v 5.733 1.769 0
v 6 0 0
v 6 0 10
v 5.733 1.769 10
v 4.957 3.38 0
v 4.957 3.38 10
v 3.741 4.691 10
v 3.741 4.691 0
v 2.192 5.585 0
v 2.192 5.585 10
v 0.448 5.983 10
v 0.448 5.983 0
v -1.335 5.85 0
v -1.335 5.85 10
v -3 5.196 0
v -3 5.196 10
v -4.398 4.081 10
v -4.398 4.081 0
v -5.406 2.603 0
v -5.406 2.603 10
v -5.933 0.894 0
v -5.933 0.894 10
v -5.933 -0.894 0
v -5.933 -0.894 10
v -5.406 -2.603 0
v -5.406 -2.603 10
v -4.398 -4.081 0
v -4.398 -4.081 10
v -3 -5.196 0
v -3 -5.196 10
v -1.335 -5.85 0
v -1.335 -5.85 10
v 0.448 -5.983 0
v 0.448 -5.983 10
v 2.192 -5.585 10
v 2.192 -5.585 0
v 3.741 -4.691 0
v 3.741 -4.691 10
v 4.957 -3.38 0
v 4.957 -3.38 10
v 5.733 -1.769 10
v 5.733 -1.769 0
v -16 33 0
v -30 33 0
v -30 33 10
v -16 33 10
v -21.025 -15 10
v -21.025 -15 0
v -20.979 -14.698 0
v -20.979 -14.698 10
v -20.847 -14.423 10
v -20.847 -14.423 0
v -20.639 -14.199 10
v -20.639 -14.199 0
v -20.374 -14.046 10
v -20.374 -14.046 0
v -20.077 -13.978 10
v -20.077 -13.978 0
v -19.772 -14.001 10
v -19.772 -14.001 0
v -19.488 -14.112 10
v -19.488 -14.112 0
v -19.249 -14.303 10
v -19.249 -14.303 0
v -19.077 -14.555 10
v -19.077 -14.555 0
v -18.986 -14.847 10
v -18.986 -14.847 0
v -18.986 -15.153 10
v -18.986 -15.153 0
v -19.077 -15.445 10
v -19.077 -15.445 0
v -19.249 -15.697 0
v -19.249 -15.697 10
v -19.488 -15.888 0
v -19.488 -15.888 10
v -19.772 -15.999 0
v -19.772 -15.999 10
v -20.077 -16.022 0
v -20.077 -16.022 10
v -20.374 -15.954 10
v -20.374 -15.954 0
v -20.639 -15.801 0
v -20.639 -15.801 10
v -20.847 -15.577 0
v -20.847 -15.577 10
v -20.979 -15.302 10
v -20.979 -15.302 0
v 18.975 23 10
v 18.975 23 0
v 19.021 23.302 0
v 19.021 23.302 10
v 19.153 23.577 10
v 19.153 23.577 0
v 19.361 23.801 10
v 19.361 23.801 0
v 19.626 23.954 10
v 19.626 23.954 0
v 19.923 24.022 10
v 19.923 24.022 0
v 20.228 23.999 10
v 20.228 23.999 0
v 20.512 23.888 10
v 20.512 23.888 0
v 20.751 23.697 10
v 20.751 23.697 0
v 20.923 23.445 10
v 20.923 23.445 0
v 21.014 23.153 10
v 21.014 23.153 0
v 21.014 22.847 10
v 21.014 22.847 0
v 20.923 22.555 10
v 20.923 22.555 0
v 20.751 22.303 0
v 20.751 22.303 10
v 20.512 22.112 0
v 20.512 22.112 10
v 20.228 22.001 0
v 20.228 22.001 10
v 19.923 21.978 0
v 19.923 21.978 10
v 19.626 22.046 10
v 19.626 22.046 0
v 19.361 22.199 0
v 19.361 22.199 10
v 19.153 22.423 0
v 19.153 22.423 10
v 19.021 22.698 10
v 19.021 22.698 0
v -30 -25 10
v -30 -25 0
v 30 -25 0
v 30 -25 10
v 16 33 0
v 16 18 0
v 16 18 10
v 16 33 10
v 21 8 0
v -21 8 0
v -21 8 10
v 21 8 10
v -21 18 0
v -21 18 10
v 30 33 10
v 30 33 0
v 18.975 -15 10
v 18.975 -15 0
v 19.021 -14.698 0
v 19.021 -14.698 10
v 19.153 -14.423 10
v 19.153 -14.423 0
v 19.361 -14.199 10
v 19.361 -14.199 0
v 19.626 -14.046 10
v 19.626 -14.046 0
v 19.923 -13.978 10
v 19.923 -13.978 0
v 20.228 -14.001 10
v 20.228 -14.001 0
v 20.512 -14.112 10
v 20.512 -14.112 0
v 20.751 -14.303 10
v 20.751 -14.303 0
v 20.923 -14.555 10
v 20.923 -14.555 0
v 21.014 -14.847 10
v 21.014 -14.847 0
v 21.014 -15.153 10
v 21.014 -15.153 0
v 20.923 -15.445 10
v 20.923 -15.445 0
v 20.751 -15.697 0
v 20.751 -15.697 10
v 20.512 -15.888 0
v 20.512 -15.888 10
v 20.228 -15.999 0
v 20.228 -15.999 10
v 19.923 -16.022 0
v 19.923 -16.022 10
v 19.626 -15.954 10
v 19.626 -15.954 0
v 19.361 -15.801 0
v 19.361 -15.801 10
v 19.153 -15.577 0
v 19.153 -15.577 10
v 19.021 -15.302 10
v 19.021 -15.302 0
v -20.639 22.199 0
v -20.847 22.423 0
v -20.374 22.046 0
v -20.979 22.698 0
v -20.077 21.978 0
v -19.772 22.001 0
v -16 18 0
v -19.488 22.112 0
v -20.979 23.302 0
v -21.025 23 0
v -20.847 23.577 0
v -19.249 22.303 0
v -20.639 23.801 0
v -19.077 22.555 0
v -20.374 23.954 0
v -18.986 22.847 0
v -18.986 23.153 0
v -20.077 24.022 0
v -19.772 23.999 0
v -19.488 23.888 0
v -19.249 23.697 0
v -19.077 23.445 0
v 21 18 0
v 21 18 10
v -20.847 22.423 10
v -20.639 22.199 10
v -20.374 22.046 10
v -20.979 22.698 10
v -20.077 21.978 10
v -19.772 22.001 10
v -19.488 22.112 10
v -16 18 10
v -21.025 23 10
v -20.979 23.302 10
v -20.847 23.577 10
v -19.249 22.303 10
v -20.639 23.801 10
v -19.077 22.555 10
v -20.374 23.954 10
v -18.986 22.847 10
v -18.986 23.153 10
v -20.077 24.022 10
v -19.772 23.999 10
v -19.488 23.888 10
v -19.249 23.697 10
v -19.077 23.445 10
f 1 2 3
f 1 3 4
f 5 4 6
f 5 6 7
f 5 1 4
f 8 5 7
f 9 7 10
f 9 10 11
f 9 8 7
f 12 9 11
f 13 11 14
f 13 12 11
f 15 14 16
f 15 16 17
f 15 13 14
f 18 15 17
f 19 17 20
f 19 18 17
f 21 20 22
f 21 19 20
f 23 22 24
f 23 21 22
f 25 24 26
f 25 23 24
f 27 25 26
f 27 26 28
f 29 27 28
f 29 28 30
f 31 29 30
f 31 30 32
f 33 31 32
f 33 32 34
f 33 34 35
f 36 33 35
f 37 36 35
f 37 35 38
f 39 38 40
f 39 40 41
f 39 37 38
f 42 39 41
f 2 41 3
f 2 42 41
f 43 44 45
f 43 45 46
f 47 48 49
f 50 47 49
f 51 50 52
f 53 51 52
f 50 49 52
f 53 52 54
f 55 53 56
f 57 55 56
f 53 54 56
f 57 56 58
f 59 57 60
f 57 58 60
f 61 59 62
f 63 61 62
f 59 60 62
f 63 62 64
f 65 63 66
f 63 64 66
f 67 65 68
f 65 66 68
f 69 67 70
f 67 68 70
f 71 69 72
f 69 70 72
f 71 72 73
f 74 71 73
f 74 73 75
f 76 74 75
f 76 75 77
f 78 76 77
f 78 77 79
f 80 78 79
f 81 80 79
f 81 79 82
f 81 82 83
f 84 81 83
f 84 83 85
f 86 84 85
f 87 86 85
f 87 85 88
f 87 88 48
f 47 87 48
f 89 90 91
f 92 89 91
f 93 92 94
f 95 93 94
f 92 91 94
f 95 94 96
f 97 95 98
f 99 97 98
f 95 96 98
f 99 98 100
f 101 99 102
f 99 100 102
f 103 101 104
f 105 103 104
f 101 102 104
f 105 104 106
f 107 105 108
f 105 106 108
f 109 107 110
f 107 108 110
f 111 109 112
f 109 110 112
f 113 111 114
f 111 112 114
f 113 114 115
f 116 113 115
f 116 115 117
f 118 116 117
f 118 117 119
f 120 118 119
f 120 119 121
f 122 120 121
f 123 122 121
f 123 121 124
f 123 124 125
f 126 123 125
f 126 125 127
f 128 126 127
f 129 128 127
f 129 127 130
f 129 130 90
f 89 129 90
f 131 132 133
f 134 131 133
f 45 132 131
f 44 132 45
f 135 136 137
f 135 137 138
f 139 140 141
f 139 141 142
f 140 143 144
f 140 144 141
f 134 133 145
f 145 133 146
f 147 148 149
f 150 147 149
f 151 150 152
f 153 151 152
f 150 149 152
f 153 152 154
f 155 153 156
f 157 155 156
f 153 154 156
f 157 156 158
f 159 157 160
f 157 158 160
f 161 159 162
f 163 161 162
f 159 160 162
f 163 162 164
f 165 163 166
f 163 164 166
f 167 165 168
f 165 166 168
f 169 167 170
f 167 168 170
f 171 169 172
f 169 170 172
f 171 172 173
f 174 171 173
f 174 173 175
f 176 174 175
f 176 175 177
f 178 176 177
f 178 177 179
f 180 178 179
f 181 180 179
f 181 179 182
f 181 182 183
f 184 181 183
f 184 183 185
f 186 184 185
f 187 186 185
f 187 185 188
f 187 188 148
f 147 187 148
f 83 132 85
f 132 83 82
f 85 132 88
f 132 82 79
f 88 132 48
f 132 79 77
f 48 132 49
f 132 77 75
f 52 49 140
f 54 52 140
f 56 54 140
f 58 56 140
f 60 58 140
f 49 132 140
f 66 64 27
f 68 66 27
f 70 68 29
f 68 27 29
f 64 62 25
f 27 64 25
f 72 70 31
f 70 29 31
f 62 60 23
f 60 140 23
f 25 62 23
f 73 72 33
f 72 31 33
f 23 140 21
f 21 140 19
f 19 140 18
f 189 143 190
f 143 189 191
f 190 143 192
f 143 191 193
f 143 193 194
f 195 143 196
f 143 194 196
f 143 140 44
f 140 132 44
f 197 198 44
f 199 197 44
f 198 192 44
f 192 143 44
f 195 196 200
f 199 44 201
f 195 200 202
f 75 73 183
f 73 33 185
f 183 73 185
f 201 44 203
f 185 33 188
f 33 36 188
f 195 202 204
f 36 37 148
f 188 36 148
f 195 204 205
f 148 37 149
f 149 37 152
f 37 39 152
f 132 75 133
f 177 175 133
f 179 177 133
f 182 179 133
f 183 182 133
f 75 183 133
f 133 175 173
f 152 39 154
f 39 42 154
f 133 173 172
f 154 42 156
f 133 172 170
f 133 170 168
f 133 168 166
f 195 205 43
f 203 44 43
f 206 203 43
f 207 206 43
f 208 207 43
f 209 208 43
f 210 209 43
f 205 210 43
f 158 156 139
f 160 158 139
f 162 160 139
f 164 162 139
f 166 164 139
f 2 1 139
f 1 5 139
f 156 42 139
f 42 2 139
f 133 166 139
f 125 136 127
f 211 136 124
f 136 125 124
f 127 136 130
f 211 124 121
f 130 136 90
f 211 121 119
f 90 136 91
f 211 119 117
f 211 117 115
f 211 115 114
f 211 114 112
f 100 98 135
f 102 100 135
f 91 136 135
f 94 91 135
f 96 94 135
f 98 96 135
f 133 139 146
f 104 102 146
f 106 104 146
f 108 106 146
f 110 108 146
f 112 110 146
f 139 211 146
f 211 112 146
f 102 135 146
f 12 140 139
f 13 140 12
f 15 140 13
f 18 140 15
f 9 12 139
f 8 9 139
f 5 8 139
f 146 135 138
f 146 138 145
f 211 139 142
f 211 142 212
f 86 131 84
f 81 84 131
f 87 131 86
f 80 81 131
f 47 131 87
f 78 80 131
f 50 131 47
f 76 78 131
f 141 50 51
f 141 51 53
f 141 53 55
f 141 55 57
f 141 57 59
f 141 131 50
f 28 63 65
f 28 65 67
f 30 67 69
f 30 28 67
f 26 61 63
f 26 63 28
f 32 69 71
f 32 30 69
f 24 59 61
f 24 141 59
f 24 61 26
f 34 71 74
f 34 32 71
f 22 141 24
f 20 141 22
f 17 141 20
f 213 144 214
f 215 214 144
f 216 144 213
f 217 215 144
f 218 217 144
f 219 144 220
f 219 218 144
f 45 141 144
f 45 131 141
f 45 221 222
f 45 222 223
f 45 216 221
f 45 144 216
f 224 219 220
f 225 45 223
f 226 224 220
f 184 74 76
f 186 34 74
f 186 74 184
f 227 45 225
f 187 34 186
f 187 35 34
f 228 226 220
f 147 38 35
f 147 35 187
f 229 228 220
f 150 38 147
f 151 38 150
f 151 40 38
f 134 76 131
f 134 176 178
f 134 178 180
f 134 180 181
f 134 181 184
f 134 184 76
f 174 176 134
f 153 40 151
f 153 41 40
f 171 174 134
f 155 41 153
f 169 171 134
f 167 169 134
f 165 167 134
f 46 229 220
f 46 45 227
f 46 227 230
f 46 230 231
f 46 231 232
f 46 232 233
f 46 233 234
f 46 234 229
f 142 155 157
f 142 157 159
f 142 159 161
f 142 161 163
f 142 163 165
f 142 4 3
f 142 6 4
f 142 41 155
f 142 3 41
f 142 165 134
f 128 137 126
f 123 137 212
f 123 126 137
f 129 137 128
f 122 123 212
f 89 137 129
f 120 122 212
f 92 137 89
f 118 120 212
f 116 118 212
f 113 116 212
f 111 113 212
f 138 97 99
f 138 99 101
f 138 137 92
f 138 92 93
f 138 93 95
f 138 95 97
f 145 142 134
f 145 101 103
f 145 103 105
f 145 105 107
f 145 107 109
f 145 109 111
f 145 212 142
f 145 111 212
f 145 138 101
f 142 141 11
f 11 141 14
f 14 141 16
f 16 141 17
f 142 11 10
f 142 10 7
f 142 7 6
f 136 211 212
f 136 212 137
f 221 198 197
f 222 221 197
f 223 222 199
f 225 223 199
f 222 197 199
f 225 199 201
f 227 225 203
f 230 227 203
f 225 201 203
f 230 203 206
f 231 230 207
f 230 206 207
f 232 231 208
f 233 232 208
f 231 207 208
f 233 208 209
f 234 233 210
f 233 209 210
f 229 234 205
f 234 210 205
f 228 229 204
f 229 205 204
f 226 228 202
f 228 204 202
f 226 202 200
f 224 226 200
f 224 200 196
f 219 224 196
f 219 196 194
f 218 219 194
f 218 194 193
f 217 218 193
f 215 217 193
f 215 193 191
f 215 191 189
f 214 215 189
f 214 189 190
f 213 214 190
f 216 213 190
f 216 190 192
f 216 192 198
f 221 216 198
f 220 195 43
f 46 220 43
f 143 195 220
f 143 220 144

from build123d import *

# Parameters (mm, degrees)
SKETCH1_W                = 60
SKETCH1_H                = 58
SKETCH1_R                = 6
SKETCH1_W_2              = 42
SKETCH1_H_2              = 10
BOSS_EXTRUDE1_DEPTH      = 10
M2_5X0_45_TAPPED_HOLE1_D = 2.05
SKETCH4_W                = 32
SKETCH4_H                = 15
CUT_EXTRUDE1_DEPTH       = 11
CUT_EXTRUDE1_DEPTH_BACK  = 1


with BuildPart() as part:
    # Sketch1 → Boss-Extrude1 (new body)
    with BuildSketch(Plane.XY):
        with Locations((0, 4)):
            Rectangle(SKETCH1_W, SKETCH1_H)
        Circle(SKETCH1_R, mode=Mode.SUBTRACT)
        with Locations((0, 13)):
            Rectangle(SKETCH1_W_2, SKETCH1_H_2, mode=Mode.SUBTRACT)
        with Locations((0, 13)):
            Rectangle(SKETCH1_W_2, SKETCH1_H_2)
    extrude(amount=BOSS_EXTRUDE1_DEPTH)

    # M2.5x0.45 Tapped Hole1 (through all)
    with Locations(Plane.XY.offset(10)):
        with Locations((20, 23), (-20, 23), (-20, -15), (20, -15)):
            Hole(M2_5X0_45_TAPPED_HOLE1_D / 2)

    # Sketch4 → Cut-Extrude1 (cut, two sides)
    with BuildSketch(Plane.XY) as cut_extrude1_sk:
        with Locations((0, 25.5)):
            Rectangle(SKETCH4_W, SKETCH4_H)
        Polygon((16, 18), (-16, 18), (-21, 18), (-21, 8), (21, 8), (21, 18), align=None)
    extrude(amount=CUT_EXTRUDE1_DEPTH, mode=Mode.SUBTRACT)
    extrude(cut_extrude1_sk.sketch, amount=-CUT_EXTRUDE1_DEPTH_BACK, mode=Mode.SUBTRACT)


solid = part.part
